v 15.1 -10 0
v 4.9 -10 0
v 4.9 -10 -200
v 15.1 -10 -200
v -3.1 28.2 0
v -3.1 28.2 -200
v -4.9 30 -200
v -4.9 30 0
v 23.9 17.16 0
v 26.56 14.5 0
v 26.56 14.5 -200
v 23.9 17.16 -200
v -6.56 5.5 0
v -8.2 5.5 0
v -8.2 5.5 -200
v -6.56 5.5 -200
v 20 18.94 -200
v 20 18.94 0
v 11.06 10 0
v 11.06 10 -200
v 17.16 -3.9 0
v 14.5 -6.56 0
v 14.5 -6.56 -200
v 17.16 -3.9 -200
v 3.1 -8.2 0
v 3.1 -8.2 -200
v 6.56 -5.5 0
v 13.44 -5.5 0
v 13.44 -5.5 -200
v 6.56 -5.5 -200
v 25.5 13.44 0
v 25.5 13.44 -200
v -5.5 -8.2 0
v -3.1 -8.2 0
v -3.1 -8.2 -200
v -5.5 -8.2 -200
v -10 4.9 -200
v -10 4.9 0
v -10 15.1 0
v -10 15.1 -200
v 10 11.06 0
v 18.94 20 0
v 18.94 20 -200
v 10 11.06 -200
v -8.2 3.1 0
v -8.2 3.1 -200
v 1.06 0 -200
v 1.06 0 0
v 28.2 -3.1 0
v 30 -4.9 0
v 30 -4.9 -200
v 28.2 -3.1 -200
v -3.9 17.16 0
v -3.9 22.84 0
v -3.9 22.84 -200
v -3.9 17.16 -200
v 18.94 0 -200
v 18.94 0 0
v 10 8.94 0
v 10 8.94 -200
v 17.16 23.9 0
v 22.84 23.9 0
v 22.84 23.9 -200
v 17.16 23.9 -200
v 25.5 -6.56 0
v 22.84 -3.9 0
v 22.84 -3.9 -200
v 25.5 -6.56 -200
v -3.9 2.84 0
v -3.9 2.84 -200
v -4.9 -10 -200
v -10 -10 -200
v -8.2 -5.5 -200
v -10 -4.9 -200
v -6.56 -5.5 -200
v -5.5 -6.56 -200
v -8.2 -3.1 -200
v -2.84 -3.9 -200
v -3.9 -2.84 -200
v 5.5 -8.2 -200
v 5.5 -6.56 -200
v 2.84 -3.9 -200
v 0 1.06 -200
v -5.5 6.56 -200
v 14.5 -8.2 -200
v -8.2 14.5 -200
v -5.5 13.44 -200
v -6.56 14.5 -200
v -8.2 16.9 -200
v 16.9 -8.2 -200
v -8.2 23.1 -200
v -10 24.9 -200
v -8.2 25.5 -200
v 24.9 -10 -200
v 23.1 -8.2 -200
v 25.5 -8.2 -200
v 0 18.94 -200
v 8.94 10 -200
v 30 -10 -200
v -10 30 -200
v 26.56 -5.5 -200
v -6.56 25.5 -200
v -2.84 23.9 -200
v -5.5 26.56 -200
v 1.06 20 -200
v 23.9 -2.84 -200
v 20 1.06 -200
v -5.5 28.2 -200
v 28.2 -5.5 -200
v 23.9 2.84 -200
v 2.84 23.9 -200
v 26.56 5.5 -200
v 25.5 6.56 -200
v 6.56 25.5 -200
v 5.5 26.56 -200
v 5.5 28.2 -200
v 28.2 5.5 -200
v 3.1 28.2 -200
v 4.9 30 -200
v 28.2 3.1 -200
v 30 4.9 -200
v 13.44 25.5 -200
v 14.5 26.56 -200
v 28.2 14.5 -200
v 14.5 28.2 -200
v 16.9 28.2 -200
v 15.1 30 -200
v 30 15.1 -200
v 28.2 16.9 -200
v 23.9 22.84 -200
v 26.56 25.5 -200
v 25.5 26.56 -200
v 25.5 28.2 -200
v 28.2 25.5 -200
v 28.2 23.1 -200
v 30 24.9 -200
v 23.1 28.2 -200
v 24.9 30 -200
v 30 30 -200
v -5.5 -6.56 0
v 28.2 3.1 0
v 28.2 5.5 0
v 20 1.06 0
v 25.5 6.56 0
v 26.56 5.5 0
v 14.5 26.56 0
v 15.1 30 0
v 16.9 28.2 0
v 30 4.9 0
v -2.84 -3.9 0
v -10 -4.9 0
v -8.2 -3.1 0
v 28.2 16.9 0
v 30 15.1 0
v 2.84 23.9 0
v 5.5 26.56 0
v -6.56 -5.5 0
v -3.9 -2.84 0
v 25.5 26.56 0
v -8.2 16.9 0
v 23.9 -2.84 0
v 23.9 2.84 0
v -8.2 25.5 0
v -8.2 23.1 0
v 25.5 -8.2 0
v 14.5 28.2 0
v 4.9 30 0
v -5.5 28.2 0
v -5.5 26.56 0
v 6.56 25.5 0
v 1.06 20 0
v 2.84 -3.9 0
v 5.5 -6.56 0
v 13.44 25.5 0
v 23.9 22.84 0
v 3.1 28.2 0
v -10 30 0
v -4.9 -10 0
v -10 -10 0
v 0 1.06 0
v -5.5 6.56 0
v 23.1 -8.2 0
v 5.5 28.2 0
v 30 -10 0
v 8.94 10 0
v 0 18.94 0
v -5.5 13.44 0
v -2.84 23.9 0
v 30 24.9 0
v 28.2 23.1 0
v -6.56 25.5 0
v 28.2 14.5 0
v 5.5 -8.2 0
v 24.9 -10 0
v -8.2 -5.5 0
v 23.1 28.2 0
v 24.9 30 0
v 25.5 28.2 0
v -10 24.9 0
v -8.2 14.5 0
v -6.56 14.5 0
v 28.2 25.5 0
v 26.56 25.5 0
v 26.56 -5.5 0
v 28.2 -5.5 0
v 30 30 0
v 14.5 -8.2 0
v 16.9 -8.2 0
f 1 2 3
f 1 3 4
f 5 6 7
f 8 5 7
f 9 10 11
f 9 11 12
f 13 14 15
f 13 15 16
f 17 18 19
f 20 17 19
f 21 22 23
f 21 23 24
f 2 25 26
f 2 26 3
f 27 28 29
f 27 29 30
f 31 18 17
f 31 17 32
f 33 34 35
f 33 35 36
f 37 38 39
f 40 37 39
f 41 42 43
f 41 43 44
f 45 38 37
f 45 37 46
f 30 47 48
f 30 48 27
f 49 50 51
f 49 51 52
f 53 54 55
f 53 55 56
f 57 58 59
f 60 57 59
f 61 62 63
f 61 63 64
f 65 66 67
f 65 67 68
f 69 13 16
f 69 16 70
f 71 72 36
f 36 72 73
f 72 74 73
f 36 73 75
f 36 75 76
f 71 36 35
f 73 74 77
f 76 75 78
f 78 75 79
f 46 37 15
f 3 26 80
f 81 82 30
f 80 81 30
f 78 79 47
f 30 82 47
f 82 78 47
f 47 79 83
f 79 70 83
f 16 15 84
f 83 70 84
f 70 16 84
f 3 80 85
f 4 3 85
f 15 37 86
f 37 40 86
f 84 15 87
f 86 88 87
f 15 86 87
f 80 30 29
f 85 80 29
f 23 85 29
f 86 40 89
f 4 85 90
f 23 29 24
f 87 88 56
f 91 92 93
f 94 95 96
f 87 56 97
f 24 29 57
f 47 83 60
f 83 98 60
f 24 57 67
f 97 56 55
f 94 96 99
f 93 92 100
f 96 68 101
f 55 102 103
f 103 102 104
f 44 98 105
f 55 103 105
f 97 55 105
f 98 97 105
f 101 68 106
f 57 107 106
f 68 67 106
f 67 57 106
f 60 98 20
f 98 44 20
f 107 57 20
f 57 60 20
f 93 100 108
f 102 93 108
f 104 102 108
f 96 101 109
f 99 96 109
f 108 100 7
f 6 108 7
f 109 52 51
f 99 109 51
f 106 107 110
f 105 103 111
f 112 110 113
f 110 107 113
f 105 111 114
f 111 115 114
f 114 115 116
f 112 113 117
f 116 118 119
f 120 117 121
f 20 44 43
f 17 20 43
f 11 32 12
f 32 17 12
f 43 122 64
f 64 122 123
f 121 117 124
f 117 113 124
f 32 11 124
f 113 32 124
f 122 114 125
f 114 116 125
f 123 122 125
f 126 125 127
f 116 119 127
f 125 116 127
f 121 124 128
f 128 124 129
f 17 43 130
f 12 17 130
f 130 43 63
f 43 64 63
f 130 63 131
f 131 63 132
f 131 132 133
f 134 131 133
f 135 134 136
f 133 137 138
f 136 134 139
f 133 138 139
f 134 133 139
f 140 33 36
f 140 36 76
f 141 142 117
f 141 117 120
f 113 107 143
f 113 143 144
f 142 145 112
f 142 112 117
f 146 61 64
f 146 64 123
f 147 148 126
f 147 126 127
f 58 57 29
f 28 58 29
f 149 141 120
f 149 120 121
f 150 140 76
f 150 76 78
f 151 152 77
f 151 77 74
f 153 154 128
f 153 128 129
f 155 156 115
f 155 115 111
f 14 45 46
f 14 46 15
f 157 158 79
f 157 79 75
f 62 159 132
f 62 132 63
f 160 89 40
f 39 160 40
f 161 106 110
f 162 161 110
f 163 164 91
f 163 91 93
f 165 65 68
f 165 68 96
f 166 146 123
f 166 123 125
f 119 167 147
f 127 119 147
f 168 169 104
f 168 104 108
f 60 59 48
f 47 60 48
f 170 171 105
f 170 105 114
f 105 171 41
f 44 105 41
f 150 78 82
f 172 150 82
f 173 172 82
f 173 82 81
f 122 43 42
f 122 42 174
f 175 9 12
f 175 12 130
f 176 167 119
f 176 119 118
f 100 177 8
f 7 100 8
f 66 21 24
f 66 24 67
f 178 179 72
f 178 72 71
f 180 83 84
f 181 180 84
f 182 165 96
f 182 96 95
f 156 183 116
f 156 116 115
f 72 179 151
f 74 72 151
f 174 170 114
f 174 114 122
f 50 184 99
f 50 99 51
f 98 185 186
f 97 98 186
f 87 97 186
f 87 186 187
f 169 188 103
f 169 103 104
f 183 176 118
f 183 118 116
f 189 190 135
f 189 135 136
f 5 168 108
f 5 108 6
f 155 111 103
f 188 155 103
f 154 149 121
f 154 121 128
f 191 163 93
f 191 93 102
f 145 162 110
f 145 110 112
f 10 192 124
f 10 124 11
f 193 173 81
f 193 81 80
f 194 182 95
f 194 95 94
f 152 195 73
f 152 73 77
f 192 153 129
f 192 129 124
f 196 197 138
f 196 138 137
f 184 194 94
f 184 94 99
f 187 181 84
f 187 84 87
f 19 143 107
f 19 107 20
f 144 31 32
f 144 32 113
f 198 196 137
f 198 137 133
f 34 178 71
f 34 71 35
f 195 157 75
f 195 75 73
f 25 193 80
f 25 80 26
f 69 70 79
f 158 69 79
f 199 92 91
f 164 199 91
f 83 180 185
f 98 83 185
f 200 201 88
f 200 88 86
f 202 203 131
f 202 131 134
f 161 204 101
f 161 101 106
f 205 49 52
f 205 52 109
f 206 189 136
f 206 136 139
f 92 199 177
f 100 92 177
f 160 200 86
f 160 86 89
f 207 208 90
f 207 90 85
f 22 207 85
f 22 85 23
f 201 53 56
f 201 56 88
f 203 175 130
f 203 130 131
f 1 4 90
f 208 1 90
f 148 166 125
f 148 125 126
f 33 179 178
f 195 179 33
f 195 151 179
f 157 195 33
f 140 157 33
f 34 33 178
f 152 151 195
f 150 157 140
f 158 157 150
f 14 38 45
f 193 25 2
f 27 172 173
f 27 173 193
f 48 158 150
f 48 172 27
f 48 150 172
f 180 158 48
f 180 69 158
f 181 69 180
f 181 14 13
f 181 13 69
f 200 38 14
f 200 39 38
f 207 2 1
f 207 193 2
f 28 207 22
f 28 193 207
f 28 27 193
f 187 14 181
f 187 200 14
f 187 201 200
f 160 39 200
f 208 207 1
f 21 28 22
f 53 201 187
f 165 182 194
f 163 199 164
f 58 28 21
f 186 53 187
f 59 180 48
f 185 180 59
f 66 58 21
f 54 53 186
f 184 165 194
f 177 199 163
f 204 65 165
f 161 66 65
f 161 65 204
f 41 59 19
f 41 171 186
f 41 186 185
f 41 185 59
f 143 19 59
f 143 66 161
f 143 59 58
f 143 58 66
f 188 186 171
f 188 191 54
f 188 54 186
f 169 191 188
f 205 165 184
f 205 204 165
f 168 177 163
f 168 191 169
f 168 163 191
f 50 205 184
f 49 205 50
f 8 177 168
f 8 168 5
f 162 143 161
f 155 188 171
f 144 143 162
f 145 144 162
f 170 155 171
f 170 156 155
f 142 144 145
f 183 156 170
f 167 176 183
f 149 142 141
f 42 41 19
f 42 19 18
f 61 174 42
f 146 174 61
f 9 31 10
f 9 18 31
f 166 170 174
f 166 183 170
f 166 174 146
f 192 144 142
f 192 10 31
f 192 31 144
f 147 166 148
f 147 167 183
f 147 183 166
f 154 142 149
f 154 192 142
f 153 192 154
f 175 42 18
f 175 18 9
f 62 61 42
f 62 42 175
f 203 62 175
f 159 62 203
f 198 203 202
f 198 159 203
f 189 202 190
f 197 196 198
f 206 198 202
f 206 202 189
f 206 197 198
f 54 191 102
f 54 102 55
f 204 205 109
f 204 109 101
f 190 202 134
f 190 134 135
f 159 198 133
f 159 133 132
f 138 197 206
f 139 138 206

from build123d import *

# Parameters (mm, degrees)
SKETCH2_W              = 20
SKETCH2_H              = 20
BOSS_EXTRUDE1_DEPTH    = 200
CUT_EXTRUDE1_DEPTH     = 201.499376558
CIRPATTERN2_COUNT      = 4
LPATTERN1_COUNT        = 2
LPATTERN1_PITCH        = 20
LPATTERN1_COUNT_DIR2   = 2
LPATTERN1_PITCH_DIR2   = 20
LPATTERN1_COPY_1_DEPTH = 201.499376558
LPATTERN1_COPY_2_DEPTH = 201.499376558
LPATTERN1_COPY_3_DEPTH = 201.499376558
LPATTERN1_COPY_4_DEPTH = 201.499376558
LPATTERN1_COPY_5_DEPTH = 201.499376558
LPATTERN1_COPY_6_DEPTH = 201.499376558
LPATTERN1_COPY_7_DEPTH = 201.499376558
LPATTERN1_COPY_8_DEPTH = 201.499376558
LPATTERN1_COPY_9_DEPTH = 201.499376558
CUT_EXTRUDE2_DEPTH     = 205.450483003


with BuildPart() as part:
    # Sketch2 → Boss-Extrude1 (new body)
    with BuildSketch(Plane.XY):
        Rectangle(SKETCH2_W, SKETCH2_H)
    boss_extrude1 = extrude(amount=-BOSS_EXTRUDE1_DEPTH)

    # Sketch3 → Cut-Extrude1 (cut, symmetric)
    with BuildSketch(Plane.XY):
        Polygon((-3.1, 8.2), (-4.9, 10), (4.9, 10), (3.1, 8.2), (5.5, 8.2), (5.5, 6.56), (2.84, 3.9), (-2.84, 3.9), (-5.5, 6.56), (-5.5, 8.2), align=None)
    cut_extrude1 = extrude(amount=CUT_EXTRUDE1_DEPTH, both=True, mode=Mode.SUBTRACT)

    # CirPattern2: Cut-Extrude1 ×4 about axis
    cirpattern2_axis = Axis((0, 0, 0), (0, 0, 1))
    for i in range(1, CIRPATTERN2_COUNT):
        add(cut_extrude1.rotate(cirpattern2_axis, i * 360 / CIRPATTERN2_COUNT), mode=Mode.SUBTRACT)

    # LPattern1: Boss-Extrude1, Cut-Extrude1 2 × 2
    with Locations(*[(j * LPATTERN1_PITCH_DIR2, i * LPATTERN1_PITCH, 0) for i in range(LPATTERN1_COUNT) for j in range(LPATTERN1_COUNT_DIR2) if (i, j) != (0, 0)]):
        add(boss_extrude1)
        add(cut_extrude1, mode=Mode.SUBTRACT)

    # LPattern1 copy 1 sketch → LPattern1 copy 1 (cut, symmetric)
    with BuildSketch(Plane(origin=(20, 0, 0), x_dir=(0, 1, 0), z_dir=(0, 0, 1))):
        Polygon((-3.1, 8.2), (-4.9, 10), (4.9, 10), (3.1, 8.2), (5.5, 8.2), (5.5, 6.56), (2.84, 3.9), (-2.84, 3.9), (-5.5, 6.56), (-5.5, 8.2), align=None)
    extrude(amount=LPATTERN1_COPY_1_DEPTH, both=True, mode=Mode.SUBTRACT)

    # LPattern1 copy 2 sketch → LPattern1 copy 2 (cut, symmetric)
    with BuildSketch(Plane(origin=(0, 20, 0), x_dir=(0, 1, 0), z_dir=(0, 0, 1))):
        Polygon((-3.1, 8.2), (-4.9, 10), (4.9, 10), (3.1, 8.2), (5.5, 8.2), (5.5, 6.56), (2.84, 3.9), (-2.84, 3.9), (-5.5, 6.56), (-5.5, 8.2), align=None)
    extrude(amount=LPATTERN1_COPY_2_DEPTH, both=True, mode=Mode.SUBTRACT)

    # LPattern1 copy 3 sketch → LPattern1 copy 3 (cut, symmetric)
    with BuildSketch(Plane(origin=(20, 20, 0), x_dir=(0, 1, 0), z_dir=(0, 0, 1))):
        Polygon((-3.1, 8.2), (-4.9, 10), (4.9, 10), (3.1, 8.2), (5.5, 8.2), (5.5, 6.56), (2.84, 3.9), (-2.84, 3.9), (-5.5, 6.56), (-5.5, 8.2), align=None)
    extrude(amount=LPATTERN1_COPY_3_DEPTH, both=True, mode=Mode.SUBTRACT)

    # LPattern1 copy 4 sketch → LPattern1 copy 4 (cut, symmetric)
    with BuildSketch(Plane(origin=(20, 0, 0), x_dir=(-1, 0, 0), z_dir=(0, 0, 1))):
        Polygon((-3.1, 8.2), (-4.9, 10), (4.9, 10), (3.1, 8.2), (5.5, 8.2), (5.5, 6.56), (2.84, 3.9), (-2.84, 3.9), (-5.5, 6.56), (-5.5, 8.2), align=None)
    extrude(amount=LPATTERN1_COPY_4_DEPTH, both=True, mode=Mode.SUBTRACT)

    # LPattern1 copy 5 sketch → LPattern1 copy 5 (cut, symmetric)
    with BuildSketch(Plane(origin=(0, 20, 0), x_dir=(-1, 0, 0), z_dir=(0, 0, 1))):
        Polygon((-3.1, 8.2), (-4.9, 10), (4.9, 10), (3.1, 8.2), (5.5, 8.2), (5.5, 6.56), (2.84, 3.9), (-2.84, 3.9), (-5.5, 6.56), (-5.5, 8.2), align=None)
    extrude(amount=LPATTERN1_COPY_5_DEPTH, both=True, mode=Mode.SUBTRACT)

    # LPattern1 copy 6 sketch → LPattern1 copy 6 (cut, symmetric)
    with BuildSketch(Plane(origin=(20, 20, 0), x_dir=(-1, 0, 0), z_dir=(0, 0, 1))):
        Polygon((-3.1, 8.2), (-4.9, 10), (4.9, 10), (3.1, 8.2), (5.5, 8.2), (5.5, 6.56), (2.84, 3.9), (-2.84, 3.9), (-5.5, 6.56), (-5.5, 8.2), align=None)
    extrude(amount=LPATTERN1_COPY_6_DEPTH, both=True, mode=Mode.SUBTRACT)

    # LPattern1 copy 7 sketch → LPattern1 copy 7 (cut, symmetric)
    with BuildSketch(Plane(origin=(20, 0, 0), x_dir=(0, -1, 0), z_dir=(0, 0, 1))):
        Polygon((-3.1, 8.2), (-4.9, 10), (4.9, 10), (3.1, 8.2), (5.5, 8.2), (5.5, 6.56), (2.84, 3.9), (-2.84, 3.9), (-5.5, 6.56), (-5.5, 8.2), align=None)
    extrude(amount=LPATTERN1_COPY_7_DEPTH, both=True, mode=Mode.SUBTRACT)

    # LPattern1 copy 8 sketch → LPattern1 copy 8 (cut, symmetric)
    with BuildSketch(Plane(origin=(0, 20, 0), x_dir=(0, -1, 0), z_dir=(0, 0, 1))):
        Polygon((-3.1, 8.2), (-4.9, 10), (4.9, 10), (3.1, 8.2), (5.5, 8.2), (5.5, 6.56), (2.84, 3.9), (-2.84, 3.9), (-5.5, 6.56), (-5.5, 8.2), align=None)
    extrude(amount=LPATTERN1_COPY_8_DEPTH, both=True, mode=Mode.SUBTRACT)

    # LPattern1 copy 9 sketch → LPattern1 copy 9 (cut, symmetric)
    with BuildSketch(Plane(origin=(20, 20, 0), x_dir=(0, -1, 0), z_dir=(0, 0, 1))):
        Polygon((-3.1, 8.2), (-4.9, 10), (4.9, 10), (3.1, 8.2), (5.5, 8.2), (5.5, 6.56), (2.84, 3.9), (-2.84, 3.9), (-5.5, 6.56), (-5.5, 8.2), align=None)
    extrude(amount=LPATTERN1_COPY_9_DEPTH, both=True, mode=Mode.SUBTRACT)

    # Sketch9 → Cut-Extrude2 (cut, through all)
    with BuildSketch(Plane.XY):
        Polygon((1.06, 0), (6.56, -5.5), (13.44, -5.5), (18.94, 0), (10, 8.94), align=None)
        Polygon((20, 1.06), (25.5, 6.56), (25.5, 11.8), (25.5, 13.44), (20, 18.94), (11.06, 10), align=None)
        Polygon((0, 1.06), (8.94, 10), (0, 18.94), (-5.5, 13.44), (-5.5, 6.56), align=None)
        Polygon((1.06, 20), (10, 11.06), (18.94, 20), (13.44, 25.5), (6.56, 25.5), align=None)
    extrude(amount=-CUT_EXTRUDE2_DEPTH, mode=Mode.SUBTRACT)


solid = part.part
